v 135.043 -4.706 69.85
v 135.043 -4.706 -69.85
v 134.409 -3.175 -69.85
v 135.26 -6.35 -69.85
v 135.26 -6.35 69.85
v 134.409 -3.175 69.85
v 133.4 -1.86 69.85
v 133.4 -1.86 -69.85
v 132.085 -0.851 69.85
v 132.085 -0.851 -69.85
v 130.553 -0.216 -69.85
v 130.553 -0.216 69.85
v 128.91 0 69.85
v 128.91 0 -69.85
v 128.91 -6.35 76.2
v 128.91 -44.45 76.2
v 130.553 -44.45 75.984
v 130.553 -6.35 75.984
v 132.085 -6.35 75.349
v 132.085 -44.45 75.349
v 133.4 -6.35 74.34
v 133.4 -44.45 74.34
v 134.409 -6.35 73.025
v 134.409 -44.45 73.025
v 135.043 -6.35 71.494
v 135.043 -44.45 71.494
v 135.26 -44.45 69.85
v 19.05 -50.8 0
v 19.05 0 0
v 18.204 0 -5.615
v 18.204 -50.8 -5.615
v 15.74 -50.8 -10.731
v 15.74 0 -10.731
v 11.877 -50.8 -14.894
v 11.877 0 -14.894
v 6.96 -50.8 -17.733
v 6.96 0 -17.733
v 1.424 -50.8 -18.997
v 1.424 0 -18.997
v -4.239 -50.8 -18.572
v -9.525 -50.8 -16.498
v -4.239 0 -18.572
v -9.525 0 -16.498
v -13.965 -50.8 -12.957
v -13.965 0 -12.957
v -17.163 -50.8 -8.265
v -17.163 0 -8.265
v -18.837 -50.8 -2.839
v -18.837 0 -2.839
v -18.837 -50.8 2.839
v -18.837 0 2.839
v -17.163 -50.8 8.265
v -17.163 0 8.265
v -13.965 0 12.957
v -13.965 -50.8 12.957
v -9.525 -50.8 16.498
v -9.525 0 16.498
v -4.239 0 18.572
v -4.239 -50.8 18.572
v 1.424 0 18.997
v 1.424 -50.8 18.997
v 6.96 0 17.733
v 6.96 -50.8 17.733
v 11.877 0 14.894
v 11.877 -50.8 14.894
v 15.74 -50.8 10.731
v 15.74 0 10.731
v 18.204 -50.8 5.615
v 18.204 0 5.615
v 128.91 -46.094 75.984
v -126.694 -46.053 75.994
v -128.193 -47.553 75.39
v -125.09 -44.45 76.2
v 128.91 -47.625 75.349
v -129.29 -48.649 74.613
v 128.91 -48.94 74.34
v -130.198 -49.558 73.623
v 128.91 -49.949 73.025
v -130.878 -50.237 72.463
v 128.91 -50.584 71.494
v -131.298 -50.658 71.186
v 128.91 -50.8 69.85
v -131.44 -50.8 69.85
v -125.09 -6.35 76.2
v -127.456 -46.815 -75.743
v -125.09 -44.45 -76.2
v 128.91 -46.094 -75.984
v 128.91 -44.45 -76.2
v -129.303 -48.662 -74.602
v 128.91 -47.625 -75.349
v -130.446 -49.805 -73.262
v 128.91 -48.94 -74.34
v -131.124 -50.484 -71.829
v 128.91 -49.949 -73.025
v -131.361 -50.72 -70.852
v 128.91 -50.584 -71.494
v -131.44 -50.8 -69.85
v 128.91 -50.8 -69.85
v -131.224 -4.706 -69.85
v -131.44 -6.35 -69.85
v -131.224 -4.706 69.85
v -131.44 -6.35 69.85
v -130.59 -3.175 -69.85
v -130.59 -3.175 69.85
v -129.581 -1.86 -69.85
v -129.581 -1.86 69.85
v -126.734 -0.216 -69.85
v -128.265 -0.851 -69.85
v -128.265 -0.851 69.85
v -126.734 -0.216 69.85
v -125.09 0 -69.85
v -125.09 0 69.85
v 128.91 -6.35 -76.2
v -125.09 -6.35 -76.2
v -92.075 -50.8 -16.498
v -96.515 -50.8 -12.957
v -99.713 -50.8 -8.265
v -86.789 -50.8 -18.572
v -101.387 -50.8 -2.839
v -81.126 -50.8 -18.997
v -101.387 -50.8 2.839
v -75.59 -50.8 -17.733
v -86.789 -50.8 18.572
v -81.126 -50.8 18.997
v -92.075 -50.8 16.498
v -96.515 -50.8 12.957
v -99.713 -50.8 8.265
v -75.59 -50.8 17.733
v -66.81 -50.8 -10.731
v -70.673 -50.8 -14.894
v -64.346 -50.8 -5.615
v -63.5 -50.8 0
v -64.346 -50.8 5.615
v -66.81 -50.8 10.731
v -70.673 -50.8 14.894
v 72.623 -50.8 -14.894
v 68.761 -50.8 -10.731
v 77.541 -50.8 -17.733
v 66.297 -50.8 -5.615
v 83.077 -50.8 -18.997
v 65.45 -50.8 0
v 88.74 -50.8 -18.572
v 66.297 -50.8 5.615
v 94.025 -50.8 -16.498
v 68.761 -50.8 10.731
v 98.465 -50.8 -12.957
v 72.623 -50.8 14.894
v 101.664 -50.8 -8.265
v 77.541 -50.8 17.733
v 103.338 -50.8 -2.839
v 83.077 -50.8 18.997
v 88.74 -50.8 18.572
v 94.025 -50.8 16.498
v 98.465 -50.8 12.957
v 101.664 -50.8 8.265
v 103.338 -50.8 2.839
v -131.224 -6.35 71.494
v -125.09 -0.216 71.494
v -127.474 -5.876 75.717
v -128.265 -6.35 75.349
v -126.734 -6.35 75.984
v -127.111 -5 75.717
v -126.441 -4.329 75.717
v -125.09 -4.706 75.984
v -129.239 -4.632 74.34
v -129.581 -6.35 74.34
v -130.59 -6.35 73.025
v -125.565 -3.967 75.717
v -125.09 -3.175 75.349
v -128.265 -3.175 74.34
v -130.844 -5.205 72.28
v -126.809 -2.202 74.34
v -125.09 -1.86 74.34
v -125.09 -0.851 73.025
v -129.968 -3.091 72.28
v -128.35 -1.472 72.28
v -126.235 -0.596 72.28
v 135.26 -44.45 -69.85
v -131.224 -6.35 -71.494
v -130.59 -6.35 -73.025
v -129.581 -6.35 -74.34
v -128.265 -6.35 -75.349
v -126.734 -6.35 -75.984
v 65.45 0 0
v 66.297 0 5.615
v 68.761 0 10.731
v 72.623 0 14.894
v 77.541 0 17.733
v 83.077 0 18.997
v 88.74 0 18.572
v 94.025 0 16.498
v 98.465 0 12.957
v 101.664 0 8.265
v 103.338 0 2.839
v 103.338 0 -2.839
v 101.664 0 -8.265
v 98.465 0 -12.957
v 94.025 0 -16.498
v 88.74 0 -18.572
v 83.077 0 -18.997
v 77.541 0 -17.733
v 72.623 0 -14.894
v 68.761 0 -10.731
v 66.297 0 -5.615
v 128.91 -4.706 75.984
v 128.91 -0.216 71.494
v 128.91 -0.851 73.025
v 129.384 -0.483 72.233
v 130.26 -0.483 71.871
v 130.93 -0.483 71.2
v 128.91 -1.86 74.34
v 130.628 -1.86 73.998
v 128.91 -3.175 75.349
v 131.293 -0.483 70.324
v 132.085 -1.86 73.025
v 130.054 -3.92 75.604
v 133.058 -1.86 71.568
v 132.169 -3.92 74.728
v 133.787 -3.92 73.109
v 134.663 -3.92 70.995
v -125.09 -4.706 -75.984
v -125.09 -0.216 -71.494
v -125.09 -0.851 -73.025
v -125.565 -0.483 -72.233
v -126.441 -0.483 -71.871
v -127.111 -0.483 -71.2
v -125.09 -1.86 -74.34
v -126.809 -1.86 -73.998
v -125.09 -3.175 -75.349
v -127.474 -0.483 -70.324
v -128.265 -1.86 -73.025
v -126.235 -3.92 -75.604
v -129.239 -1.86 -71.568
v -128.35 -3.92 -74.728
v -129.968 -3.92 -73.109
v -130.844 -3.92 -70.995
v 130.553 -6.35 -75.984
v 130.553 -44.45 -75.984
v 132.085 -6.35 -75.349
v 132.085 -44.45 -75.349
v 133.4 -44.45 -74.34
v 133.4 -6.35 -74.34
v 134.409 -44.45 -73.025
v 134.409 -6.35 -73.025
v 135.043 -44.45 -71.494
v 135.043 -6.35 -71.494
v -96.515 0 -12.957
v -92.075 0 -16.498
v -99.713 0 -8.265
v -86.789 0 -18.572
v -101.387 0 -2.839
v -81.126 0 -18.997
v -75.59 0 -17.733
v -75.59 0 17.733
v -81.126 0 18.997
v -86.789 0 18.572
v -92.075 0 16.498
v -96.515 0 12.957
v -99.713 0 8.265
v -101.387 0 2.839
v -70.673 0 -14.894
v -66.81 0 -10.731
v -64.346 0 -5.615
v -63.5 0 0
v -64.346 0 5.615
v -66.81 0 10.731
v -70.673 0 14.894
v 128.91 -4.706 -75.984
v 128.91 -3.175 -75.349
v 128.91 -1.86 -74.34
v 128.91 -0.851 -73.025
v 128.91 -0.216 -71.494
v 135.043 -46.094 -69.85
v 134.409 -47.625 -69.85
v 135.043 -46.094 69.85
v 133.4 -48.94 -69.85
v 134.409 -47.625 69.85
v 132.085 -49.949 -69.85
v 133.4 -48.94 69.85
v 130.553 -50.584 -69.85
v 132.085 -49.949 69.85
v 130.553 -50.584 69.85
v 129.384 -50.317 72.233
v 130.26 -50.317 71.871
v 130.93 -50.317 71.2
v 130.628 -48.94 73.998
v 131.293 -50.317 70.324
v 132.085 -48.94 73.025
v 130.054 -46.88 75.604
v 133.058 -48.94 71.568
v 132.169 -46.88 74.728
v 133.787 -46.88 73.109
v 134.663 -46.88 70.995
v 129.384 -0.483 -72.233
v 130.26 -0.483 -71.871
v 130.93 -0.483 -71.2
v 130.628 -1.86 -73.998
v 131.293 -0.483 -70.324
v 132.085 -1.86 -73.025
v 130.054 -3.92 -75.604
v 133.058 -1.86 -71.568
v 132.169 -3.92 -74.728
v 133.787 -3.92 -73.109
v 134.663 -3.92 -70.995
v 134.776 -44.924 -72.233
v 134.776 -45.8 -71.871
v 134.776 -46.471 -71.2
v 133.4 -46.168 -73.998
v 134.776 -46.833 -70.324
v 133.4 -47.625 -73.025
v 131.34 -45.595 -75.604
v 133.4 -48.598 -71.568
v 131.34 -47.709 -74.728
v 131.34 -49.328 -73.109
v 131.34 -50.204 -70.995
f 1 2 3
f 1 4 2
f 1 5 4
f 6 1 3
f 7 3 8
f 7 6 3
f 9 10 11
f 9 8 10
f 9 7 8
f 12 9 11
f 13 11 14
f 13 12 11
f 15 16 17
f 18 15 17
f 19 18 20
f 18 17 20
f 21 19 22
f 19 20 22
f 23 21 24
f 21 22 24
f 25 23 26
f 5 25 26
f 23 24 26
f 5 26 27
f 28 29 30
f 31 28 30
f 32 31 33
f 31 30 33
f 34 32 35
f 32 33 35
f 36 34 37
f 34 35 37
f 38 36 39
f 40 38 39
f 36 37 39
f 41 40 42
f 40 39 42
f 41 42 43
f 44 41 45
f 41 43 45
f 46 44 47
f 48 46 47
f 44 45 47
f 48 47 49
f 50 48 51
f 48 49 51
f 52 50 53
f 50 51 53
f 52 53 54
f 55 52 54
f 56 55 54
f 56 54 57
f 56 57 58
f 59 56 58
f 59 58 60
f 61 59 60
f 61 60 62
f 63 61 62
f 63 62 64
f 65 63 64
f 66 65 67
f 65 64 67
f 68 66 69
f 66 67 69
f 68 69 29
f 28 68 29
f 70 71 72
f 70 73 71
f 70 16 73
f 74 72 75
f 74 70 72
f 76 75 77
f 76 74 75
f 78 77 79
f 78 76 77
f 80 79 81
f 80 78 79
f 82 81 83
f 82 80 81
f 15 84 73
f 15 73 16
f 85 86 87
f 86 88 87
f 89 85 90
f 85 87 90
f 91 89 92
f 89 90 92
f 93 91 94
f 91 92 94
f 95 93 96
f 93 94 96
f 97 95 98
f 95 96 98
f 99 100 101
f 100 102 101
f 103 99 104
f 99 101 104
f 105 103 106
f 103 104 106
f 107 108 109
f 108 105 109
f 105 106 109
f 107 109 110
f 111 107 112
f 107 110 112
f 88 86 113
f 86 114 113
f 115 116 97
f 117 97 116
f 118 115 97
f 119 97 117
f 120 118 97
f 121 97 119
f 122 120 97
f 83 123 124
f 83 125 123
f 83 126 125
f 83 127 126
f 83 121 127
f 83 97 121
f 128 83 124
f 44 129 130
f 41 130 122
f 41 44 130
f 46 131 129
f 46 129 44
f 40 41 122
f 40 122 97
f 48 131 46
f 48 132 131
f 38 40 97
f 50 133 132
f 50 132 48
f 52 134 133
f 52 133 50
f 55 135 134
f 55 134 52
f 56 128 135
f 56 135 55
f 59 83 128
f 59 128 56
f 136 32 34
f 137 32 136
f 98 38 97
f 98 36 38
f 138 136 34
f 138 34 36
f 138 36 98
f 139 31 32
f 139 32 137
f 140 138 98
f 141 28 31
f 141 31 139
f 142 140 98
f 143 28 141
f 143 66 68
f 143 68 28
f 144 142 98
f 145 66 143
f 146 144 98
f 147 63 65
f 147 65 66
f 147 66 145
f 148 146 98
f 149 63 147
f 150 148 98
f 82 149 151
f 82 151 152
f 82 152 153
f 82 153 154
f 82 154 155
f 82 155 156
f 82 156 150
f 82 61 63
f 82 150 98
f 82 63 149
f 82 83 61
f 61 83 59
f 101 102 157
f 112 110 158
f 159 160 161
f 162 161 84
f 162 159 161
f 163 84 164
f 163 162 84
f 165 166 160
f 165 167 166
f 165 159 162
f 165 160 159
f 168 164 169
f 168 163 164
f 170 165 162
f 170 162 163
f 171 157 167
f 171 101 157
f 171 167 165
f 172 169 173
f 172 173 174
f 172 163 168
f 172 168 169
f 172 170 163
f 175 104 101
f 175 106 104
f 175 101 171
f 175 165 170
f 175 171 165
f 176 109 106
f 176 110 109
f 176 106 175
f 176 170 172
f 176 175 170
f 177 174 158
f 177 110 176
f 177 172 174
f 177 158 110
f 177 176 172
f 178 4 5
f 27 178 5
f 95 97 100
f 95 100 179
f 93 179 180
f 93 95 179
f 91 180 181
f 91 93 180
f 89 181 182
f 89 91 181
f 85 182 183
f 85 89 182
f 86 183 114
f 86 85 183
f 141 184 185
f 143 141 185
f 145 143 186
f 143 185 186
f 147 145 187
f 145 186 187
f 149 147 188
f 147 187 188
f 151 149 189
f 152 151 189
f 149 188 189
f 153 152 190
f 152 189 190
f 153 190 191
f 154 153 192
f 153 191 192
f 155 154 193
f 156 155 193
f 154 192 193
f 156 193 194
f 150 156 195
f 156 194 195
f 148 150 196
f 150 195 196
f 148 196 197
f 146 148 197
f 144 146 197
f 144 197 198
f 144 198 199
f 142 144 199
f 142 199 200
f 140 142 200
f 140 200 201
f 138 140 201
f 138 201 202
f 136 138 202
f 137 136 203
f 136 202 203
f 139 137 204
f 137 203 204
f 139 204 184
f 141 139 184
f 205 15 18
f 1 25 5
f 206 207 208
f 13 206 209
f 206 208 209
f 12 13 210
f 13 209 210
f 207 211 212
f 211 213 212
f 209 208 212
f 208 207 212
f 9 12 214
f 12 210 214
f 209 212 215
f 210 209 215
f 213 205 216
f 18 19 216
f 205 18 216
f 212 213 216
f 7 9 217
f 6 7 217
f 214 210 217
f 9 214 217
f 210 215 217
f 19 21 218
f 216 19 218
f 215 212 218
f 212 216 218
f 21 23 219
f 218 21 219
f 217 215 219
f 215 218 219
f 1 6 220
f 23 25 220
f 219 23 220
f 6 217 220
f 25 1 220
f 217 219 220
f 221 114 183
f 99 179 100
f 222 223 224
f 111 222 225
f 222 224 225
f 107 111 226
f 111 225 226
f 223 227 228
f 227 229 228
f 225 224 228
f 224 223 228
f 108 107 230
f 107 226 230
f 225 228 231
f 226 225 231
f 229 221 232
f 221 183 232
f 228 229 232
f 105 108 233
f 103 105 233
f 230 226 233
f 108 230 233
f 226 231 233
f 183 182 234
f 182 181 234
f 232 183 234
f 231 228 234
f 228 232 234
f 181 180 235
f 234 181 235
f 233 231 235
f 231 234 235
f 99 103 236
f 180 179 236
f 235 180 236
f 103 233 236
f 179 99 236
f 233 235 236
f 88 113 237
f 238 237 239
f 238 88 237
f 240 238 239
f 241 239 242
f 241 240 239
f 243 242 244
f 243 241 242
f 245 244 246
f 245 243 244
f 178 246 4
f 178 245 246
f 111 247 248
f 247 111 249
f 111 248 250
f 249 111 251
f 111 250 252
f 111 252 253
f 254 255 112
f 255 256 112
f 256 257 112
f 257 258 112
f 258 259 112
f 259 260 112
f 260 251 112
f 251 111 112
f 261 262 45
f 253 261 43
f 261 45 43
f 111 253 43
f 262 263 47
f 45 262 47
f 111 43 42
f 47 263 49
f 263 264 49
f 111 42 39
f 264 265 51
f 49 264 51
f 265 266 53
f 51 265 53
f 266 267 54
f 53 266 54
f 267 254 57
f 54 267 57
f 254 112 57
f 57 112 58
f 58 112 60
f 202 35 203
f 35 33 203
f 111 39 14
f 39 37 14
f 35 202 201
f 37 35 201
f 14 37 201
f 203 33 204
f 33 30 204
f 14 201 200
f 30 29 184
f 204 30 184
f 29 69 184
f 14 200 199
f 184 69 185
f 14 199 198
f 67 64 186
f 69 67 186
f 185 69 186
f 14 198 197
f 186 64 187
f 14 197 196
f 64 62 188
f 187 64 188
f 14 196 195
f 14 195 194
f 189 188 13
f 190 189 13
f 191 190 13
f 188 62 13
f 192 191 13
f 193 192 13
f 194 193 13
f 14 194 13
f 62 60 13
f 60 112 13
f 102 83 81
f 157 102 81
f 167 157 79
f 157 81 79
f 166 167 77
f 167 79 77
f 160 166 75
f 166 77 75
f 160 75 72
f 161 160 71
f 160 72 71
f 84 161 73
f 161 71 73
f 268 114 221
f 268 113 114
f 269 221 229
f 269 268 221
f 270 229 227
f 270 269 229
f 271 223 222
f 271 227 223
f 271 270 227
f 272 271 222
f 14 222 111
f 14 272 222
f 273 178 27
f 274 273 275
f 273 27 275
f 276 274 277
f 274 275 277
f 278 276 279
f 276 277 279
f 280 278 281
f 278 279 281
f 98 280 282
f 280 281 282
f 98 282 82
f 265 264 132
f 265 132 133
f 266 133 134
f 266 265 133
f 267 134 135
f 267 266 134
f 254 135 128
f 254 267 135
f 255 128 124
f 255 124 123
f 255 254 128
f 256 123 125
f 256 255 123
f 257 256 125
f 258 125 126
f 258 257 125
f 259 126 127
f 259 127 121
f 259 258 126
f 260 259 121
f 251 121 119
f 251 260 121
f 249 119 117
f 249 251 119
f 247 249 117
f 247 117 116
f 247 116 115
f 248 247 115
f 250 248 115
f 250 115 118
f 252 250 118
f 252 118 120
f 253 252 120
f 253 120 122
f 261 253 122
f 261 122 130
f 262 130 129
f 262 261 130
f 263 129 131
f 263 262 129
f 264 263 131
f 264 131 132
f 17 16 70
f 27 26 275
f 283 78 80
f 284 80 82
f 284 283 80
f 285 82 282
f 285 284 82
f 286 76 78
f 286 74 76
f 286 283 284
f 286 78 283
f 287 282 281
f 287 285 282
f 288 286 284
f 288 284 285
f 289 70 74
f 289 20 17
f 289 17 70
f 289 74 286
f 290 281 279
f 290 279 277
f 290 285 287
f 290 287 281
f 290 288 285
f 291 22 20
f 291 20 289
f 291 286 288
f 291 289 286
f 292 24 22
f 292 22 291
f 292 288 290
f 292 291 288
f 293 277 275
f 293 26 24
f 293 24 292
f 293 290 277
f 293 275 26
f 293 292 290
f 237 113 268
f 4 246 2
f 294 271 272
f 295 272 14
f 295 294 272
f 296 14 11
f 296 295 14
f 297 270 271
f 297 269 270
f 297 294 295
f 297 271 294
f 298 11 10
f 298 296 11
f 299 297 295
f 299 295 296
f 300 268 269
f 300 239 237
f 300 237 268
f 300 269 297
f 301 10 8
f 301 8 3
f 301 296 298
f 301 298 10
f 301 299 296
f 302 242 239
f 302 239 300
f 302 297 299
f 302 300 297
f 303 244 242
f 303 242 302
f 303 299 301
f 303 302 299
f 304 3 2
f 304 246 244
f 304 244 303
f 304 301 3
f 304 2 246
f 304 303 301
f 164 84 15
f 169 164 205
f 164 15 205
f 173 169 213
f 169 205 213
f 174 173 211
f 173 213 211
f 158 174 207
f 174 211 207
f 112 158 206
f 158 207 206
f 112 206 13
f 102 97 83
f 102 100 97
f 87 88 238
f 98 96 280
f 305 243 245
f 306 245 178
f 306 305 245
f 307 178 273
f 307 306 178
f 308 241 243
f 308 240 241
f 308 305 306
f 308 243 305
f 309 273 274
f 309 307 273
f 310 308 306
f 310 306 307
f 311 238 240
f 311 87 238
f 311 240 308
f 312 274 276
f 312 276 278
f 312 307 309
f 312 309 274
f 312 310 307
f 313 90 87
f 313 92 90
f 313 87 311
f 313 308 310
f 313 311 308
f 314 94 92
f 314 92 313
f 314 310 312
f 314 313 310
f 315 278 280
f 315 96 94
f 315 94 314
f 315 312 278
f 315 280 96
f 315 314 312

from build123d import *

# Parameters (mm, degrees)
F0_W     = 266.7
F0_H     = 152.4
F0_R     = 19.05
F1_DEPTH = 50.8
F2_R     = 6.35


with BuildPart() as f1:
    # F0 (on Front) → F1 (new body)
    with BuildSketch(Plane.XZ):
        with Locations((1.909529, 0)):
            Rectangle(F0_W, F0_H)
        with Locations((-82.55, 0)):
            Circle(F0_R, mode=Mode.SUBTRACT)
        with BuildLine():
            ThreePointArc((-19.05, 0), (0, 19.05), (19.05, 0))
            ThreePointArc((19.05, 0), (0, -19.05), (-19.05, 0))
        make_face(mode=Mode.SUBTRACT)
        with BuildLine():
            ThreePointArc((103.550499, 0), (84.500499, -19.05), (65.450499, 0))
            ThreePointArc((65.450499, 0), (84.500499, 19.05), (103.550499, 0))
        make_face(mode=Mode.SUBTRACT)
    extrude(amount=F1_DEPTH)

    # F2
    f2_edges = [f1.edges().sort_by_distance(p)[0] for p in [
        (1.909529, -50.8, -76.2),
        (-131.440471, -25.4, -76.2),
        (135.259529, -25.4, -76.2),
        (1.909529, 0, -76.2),
        (-131.440471, 0, 0),
        (135.259529, -25.4, 76.2),
        (-131.440471, -25.4, 76.2),
        (1.909529, 0, 76.2),
        (1.909529, -50.8, 76.2),
        (135.259529, 0, 0),
        (135.259529, -50.8, 0),
    ]]
    fillet(f2_edges, radius=F2_R)


solid = f1.part
